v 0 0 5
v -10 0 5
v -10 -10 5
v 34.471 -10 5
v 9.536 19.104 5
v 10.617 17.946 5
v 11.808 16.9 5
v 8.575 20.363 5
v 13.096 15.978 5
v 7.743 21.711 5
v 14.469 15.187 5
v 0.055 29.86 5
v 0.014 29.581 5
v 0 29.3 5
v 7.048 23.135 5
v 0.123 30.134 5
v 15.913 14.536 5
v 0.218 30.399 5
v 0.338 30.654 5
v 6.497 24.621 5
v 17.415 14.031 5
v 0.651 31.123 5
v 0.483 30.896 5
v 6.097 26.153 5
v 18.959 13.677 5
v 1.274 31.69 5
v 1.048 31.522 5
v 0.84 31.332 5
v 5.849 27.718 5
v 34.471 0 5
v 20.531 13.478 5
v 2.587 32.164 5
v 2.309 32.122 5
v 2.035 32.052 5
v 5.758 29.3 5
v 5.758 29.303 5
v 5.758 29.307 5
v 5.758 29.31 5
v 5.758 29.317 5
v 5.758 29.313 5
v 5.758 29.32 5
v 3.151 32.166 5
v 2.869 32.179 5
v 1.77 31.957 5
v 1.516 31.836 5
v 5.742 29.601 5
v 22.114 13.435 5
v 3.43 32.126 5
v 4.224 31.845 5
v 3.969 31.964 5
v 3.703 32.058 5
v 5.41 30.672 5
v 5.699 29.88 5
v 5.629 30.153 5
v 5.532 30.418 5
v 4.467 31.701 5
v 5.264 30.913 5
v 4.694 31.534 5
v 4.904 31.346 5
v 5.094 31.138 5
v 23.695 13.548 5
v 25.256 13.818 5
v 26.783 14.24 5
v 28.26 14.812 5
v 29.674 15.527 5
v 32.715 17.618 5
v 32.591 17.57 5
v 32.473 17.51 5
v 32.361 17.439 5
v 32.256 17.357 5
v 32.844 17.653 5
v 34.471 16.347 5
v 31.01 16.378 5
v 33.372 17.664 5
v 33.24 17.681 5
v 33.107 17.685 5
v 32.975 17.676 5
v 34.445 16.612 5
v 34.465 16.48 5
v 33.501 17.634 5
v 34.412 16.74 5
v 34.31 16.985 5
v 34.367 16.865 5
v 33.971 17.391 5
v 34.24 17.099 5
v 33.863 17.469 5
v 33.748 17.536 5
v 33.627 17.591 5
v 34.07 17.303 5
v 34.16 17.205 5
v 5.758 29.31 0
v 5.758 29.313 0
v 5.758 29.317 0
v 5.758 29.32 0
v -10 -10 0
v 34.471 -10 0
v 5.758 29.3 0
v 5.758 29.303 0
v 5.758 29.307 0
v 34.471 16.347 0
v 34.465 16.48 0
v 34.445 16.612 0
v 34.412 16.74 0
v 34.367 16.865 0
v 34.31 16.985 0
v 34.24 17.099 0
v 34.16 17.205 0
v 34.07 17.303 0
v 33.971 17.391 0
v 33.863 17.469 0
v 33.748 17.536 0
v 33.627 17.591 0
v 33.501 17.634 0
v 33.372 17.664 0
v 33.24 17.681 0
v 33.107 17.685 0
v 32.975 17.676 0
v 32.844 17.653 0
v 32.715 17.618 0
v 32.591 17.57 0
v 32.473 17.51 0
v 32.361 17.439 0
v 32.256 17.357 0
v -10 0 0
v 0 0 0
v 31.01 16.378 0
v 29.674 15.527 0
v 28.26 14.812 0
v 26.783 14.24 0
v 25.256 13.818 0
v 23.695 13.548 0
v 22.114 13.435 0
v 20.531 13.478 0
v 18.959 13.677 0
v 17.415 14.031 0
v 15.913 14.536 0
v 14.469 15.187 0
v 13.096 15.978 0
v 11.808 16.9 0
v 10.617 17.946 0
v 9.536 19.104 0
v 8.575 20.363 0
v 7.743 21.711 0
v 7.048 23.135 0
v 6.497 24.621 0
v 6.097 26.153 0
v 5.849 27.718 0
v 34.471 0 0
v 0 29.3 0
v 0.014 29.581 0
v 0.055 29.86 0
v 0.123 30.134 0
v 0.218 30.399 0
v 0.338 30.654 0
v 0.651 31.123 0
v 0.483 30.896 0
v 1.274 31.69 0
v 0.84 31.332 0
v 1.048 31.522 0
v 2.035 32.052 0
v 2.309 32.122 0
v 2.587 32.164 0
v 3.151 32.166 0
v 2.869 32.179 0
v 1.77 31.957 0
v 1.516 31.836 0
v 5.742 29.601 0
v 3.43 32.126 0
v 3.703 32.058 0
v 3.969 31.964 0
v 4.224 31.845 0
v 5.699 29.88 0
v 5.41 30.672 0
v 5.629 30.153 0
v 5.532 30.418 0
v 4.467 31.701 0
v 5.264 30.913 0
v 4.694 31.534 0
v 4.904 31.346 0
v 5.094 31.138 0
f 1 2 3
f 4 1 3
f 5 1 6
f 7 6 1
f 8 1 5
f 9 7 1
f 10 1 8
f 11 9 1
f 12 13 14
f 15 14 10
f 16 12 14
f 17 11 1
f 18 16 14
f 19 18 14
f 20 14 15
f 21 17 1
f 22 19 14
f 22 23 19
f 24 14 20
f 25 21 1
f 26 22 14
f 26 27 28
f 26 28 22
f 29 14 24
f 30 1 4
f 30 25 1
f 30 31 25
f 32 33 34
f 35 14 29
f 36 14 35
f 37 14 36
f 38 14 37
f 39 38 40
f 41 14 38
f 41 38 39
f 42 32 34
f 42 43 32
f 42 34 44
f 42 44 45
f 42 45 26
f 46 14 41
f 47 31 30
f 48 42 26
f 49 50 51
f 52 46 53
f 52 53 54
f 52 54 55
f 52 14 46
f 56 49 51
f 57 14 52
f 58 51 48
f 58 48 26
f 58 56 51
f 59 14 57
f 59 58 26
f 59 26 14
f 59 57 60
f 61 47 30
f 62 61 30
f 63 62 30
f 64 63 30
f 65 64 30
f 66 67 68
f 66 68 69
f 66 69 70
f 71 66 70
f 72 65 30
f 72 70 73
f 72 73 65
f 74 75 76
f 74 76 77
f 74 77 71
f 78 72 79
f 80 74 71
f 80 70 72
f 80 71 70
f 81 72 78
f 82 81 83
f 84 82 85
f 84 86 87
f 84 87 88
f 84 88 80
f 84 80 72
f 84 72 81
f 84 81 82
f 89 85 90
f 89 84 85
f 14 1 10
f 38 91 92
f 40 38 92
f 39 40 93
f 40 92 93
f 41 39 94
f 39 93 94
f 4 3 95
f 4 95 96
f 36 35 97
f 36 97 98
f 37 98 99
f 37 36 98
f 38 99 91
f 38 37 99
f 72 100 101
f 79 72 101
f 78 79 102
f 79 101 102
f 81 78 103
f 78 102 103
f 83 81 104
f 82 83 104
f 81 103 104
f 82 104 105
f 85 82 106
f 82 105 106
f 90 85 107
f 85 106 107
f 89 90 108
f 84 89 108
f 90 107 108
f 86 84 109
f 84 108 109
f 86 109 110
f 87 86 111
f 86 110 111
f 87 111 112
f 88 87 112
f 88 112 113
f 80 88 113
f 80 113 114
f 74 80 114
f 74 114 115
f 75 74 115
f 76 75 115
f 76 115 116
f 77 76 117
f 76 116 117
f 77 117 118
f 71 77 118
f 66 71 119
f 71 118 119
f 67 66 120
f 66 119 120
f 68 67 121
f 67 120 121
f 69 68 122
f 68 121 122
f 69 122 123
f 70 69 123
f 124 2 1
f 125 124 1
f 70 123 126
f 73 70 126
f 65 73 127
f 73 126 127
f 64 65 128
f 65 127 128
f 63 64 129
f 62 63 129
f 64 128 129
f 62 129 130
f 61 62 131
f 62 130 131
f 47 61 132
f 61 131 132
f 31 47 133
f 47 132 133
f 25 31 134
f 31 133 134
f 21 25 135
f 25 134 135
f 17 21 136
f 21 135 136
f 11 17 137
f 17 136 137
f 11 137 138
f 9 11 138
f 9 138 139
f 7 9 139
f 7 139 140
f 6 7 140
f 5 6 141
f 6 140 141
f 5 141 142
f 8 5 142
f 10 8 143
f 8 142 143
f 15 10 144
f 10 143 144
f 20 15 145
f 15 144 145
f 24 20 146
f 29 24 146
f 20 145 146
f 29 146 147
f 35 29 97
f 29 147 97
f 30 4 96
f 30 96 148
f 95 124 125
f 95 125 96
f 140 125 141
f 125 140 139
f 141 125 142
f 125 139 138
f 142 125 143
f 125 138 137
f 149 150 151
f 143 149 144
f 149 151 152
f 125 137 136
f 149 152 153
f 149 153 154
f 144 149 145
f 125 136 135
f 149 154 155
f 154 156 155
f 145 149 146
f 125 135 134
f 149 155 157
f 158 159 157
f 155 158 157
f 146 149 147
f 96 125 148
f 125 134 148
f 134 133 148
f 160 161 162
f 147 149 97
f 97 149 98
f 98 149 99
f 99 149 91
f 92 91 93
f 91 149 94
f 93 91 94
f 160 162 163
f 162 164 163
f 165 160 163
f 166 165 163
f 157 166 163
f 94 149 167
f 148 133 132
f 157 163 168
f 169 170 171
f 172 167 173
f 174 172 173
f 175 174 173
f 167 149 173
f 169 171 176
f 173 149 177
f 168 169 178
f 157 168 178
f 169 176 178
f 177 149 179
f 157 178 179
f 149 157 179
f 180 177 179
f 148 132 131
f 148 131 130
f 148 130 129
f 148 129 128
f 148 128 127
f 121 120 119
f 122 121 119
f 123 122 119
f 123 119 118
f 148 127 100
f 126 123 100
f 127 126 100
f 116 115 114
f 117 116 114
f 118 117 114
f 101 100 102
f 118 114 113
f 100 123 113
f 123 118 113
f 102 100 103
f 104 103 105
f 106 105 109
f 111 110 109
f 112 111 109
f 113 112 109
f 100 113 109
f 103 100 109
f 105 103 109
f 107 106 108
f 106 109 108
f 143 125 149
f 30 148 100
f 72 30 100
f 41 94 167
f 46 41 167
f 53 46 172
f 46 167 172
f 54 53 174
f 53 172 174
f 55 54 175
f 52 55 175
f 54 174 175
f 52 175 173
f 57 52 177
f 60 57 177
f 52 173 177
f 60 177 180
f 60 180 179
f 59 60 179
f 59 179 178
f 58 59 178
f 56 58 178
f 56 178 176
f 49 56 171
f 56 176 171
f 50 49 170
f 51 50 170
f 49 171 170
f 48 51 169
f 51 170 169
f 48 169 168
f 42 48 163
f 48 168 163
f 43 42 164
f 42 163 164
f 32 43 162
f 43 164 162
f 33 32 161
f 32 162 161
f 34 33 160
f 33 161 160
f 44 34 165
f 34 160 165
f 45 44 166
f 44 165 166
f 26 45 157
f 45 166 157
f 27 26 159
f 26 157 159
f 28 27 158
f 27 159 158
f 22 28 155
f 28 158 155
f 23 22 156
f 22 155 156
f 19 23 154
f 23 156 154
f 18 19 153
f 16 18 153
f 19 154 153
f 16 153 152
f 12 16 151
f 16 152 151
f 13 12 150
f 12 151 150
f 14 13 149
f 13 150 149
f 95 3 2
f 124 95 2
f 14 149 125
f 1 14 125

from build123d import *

# Parameters (mm, degrees)
F1_DEPTH = 5
F2_W     = 34.4714387385
F2_H     = 10
F2_W_2   = 10
F3_DEPTH = 5


# Not quite as in the source:
# - ends of sketch curves that miss each other by under 0.0002 mm in the source are joined


with BuildPart() as f1:
    # F0 (on Top) → F1 (new body)
    with BuildSketch(Plane.XY):
        with BuildLine():
            Line((0, 29.2999204248), (0, 0))
            Line((0, 0), (34.4714387385, 0))
            Line((34.4714387385, 0), (34.4714387385, 16.3473710418))
            ThreePointArc((34.4714387385, 16.3473710418), (32.5790927131, 15.1300794804), (32.2559916738, 17.3568210333))
            ThreePointArc((32.2559916738, 17.3568210333), (15.182844974, 14.8438668457), (5.7578901922, 29.2999210911))
            ThreePointArc((5.7578901922, 29.2999210911), (2.8789043427, 26.4210160822), (0, 29.2999204248))
        make_face()
        with BuildLine():
            ThreePointArc((5.7577396052, 29.3198639813), (2.8689325046, 32.1788074974), (0, 29.2999204248))
            ThreePointArc((0, 29.2999204248), (2.8789043427, 26.4210160822), (5.7578086853, 29.2999204248))
            ThreePointArc((5.7578086853, 29.2999204248), (5.7578117914, 29.3098925127), (5.7577396052, 29.3198639813))
        make_face()
        with BuildLine():
            ThreePointArc((32.2559916738, 17.3568210333), (32.5790927131, 15.1300794804), (34.4714387385, 16.3473710418))
            ThreePointArc((34.4714387385, 16.3473710418), (33.6883902233, 17.5646626032), (32.2559916738, 17.3568210333))
        make_face()
    extrude(amount=F1_DEPTH)

    # F2 (on face) → F3 (join)
    with BuildSketch(Plane.XY.offset(5)):
        with BuildLine():
            Line((0, 0), (34.4714387385, 0))
            Line((34.4714387385, 0), (34.4714387385, 16.3473710418))
            ThreePointArc((34.4714387385, 16.3473710418), (33.6883902233, 17.5646626032), (32.2559916738, 17.3568210333))
            ThreePointArc((32.2559916738, 17.3568210333), (15.182844974, 14.8438668457), (5.7578901922, 29.2999210911))
            ThreePointArc((5.7578901922, 29.2999210911), (5.757811792, 29.3098923335), (5.7577396052, 29.3198639813))
            ThreePointArc((5.7577396052, 29.3198639813), (2.8689325046, 32.1788074974), (0, 29.2999204248))
            Line((0, 29.2999204248), (0, 25.4882741719))
            Line((0, 25.4882741719), (0, 0))
        make_face()
        with Locations((17.2357193692, -5)):
            Rectangle(F2_W, F2_H)
        with Locations((-5, -5)):
            Rectangle(F2_W_2, F2_H)
        with Locations((-5, -5)):
            Rectangle(F2_W_2, F2_H)
    extrude(amount=-F3_DEPTH)


solid = f1.part
